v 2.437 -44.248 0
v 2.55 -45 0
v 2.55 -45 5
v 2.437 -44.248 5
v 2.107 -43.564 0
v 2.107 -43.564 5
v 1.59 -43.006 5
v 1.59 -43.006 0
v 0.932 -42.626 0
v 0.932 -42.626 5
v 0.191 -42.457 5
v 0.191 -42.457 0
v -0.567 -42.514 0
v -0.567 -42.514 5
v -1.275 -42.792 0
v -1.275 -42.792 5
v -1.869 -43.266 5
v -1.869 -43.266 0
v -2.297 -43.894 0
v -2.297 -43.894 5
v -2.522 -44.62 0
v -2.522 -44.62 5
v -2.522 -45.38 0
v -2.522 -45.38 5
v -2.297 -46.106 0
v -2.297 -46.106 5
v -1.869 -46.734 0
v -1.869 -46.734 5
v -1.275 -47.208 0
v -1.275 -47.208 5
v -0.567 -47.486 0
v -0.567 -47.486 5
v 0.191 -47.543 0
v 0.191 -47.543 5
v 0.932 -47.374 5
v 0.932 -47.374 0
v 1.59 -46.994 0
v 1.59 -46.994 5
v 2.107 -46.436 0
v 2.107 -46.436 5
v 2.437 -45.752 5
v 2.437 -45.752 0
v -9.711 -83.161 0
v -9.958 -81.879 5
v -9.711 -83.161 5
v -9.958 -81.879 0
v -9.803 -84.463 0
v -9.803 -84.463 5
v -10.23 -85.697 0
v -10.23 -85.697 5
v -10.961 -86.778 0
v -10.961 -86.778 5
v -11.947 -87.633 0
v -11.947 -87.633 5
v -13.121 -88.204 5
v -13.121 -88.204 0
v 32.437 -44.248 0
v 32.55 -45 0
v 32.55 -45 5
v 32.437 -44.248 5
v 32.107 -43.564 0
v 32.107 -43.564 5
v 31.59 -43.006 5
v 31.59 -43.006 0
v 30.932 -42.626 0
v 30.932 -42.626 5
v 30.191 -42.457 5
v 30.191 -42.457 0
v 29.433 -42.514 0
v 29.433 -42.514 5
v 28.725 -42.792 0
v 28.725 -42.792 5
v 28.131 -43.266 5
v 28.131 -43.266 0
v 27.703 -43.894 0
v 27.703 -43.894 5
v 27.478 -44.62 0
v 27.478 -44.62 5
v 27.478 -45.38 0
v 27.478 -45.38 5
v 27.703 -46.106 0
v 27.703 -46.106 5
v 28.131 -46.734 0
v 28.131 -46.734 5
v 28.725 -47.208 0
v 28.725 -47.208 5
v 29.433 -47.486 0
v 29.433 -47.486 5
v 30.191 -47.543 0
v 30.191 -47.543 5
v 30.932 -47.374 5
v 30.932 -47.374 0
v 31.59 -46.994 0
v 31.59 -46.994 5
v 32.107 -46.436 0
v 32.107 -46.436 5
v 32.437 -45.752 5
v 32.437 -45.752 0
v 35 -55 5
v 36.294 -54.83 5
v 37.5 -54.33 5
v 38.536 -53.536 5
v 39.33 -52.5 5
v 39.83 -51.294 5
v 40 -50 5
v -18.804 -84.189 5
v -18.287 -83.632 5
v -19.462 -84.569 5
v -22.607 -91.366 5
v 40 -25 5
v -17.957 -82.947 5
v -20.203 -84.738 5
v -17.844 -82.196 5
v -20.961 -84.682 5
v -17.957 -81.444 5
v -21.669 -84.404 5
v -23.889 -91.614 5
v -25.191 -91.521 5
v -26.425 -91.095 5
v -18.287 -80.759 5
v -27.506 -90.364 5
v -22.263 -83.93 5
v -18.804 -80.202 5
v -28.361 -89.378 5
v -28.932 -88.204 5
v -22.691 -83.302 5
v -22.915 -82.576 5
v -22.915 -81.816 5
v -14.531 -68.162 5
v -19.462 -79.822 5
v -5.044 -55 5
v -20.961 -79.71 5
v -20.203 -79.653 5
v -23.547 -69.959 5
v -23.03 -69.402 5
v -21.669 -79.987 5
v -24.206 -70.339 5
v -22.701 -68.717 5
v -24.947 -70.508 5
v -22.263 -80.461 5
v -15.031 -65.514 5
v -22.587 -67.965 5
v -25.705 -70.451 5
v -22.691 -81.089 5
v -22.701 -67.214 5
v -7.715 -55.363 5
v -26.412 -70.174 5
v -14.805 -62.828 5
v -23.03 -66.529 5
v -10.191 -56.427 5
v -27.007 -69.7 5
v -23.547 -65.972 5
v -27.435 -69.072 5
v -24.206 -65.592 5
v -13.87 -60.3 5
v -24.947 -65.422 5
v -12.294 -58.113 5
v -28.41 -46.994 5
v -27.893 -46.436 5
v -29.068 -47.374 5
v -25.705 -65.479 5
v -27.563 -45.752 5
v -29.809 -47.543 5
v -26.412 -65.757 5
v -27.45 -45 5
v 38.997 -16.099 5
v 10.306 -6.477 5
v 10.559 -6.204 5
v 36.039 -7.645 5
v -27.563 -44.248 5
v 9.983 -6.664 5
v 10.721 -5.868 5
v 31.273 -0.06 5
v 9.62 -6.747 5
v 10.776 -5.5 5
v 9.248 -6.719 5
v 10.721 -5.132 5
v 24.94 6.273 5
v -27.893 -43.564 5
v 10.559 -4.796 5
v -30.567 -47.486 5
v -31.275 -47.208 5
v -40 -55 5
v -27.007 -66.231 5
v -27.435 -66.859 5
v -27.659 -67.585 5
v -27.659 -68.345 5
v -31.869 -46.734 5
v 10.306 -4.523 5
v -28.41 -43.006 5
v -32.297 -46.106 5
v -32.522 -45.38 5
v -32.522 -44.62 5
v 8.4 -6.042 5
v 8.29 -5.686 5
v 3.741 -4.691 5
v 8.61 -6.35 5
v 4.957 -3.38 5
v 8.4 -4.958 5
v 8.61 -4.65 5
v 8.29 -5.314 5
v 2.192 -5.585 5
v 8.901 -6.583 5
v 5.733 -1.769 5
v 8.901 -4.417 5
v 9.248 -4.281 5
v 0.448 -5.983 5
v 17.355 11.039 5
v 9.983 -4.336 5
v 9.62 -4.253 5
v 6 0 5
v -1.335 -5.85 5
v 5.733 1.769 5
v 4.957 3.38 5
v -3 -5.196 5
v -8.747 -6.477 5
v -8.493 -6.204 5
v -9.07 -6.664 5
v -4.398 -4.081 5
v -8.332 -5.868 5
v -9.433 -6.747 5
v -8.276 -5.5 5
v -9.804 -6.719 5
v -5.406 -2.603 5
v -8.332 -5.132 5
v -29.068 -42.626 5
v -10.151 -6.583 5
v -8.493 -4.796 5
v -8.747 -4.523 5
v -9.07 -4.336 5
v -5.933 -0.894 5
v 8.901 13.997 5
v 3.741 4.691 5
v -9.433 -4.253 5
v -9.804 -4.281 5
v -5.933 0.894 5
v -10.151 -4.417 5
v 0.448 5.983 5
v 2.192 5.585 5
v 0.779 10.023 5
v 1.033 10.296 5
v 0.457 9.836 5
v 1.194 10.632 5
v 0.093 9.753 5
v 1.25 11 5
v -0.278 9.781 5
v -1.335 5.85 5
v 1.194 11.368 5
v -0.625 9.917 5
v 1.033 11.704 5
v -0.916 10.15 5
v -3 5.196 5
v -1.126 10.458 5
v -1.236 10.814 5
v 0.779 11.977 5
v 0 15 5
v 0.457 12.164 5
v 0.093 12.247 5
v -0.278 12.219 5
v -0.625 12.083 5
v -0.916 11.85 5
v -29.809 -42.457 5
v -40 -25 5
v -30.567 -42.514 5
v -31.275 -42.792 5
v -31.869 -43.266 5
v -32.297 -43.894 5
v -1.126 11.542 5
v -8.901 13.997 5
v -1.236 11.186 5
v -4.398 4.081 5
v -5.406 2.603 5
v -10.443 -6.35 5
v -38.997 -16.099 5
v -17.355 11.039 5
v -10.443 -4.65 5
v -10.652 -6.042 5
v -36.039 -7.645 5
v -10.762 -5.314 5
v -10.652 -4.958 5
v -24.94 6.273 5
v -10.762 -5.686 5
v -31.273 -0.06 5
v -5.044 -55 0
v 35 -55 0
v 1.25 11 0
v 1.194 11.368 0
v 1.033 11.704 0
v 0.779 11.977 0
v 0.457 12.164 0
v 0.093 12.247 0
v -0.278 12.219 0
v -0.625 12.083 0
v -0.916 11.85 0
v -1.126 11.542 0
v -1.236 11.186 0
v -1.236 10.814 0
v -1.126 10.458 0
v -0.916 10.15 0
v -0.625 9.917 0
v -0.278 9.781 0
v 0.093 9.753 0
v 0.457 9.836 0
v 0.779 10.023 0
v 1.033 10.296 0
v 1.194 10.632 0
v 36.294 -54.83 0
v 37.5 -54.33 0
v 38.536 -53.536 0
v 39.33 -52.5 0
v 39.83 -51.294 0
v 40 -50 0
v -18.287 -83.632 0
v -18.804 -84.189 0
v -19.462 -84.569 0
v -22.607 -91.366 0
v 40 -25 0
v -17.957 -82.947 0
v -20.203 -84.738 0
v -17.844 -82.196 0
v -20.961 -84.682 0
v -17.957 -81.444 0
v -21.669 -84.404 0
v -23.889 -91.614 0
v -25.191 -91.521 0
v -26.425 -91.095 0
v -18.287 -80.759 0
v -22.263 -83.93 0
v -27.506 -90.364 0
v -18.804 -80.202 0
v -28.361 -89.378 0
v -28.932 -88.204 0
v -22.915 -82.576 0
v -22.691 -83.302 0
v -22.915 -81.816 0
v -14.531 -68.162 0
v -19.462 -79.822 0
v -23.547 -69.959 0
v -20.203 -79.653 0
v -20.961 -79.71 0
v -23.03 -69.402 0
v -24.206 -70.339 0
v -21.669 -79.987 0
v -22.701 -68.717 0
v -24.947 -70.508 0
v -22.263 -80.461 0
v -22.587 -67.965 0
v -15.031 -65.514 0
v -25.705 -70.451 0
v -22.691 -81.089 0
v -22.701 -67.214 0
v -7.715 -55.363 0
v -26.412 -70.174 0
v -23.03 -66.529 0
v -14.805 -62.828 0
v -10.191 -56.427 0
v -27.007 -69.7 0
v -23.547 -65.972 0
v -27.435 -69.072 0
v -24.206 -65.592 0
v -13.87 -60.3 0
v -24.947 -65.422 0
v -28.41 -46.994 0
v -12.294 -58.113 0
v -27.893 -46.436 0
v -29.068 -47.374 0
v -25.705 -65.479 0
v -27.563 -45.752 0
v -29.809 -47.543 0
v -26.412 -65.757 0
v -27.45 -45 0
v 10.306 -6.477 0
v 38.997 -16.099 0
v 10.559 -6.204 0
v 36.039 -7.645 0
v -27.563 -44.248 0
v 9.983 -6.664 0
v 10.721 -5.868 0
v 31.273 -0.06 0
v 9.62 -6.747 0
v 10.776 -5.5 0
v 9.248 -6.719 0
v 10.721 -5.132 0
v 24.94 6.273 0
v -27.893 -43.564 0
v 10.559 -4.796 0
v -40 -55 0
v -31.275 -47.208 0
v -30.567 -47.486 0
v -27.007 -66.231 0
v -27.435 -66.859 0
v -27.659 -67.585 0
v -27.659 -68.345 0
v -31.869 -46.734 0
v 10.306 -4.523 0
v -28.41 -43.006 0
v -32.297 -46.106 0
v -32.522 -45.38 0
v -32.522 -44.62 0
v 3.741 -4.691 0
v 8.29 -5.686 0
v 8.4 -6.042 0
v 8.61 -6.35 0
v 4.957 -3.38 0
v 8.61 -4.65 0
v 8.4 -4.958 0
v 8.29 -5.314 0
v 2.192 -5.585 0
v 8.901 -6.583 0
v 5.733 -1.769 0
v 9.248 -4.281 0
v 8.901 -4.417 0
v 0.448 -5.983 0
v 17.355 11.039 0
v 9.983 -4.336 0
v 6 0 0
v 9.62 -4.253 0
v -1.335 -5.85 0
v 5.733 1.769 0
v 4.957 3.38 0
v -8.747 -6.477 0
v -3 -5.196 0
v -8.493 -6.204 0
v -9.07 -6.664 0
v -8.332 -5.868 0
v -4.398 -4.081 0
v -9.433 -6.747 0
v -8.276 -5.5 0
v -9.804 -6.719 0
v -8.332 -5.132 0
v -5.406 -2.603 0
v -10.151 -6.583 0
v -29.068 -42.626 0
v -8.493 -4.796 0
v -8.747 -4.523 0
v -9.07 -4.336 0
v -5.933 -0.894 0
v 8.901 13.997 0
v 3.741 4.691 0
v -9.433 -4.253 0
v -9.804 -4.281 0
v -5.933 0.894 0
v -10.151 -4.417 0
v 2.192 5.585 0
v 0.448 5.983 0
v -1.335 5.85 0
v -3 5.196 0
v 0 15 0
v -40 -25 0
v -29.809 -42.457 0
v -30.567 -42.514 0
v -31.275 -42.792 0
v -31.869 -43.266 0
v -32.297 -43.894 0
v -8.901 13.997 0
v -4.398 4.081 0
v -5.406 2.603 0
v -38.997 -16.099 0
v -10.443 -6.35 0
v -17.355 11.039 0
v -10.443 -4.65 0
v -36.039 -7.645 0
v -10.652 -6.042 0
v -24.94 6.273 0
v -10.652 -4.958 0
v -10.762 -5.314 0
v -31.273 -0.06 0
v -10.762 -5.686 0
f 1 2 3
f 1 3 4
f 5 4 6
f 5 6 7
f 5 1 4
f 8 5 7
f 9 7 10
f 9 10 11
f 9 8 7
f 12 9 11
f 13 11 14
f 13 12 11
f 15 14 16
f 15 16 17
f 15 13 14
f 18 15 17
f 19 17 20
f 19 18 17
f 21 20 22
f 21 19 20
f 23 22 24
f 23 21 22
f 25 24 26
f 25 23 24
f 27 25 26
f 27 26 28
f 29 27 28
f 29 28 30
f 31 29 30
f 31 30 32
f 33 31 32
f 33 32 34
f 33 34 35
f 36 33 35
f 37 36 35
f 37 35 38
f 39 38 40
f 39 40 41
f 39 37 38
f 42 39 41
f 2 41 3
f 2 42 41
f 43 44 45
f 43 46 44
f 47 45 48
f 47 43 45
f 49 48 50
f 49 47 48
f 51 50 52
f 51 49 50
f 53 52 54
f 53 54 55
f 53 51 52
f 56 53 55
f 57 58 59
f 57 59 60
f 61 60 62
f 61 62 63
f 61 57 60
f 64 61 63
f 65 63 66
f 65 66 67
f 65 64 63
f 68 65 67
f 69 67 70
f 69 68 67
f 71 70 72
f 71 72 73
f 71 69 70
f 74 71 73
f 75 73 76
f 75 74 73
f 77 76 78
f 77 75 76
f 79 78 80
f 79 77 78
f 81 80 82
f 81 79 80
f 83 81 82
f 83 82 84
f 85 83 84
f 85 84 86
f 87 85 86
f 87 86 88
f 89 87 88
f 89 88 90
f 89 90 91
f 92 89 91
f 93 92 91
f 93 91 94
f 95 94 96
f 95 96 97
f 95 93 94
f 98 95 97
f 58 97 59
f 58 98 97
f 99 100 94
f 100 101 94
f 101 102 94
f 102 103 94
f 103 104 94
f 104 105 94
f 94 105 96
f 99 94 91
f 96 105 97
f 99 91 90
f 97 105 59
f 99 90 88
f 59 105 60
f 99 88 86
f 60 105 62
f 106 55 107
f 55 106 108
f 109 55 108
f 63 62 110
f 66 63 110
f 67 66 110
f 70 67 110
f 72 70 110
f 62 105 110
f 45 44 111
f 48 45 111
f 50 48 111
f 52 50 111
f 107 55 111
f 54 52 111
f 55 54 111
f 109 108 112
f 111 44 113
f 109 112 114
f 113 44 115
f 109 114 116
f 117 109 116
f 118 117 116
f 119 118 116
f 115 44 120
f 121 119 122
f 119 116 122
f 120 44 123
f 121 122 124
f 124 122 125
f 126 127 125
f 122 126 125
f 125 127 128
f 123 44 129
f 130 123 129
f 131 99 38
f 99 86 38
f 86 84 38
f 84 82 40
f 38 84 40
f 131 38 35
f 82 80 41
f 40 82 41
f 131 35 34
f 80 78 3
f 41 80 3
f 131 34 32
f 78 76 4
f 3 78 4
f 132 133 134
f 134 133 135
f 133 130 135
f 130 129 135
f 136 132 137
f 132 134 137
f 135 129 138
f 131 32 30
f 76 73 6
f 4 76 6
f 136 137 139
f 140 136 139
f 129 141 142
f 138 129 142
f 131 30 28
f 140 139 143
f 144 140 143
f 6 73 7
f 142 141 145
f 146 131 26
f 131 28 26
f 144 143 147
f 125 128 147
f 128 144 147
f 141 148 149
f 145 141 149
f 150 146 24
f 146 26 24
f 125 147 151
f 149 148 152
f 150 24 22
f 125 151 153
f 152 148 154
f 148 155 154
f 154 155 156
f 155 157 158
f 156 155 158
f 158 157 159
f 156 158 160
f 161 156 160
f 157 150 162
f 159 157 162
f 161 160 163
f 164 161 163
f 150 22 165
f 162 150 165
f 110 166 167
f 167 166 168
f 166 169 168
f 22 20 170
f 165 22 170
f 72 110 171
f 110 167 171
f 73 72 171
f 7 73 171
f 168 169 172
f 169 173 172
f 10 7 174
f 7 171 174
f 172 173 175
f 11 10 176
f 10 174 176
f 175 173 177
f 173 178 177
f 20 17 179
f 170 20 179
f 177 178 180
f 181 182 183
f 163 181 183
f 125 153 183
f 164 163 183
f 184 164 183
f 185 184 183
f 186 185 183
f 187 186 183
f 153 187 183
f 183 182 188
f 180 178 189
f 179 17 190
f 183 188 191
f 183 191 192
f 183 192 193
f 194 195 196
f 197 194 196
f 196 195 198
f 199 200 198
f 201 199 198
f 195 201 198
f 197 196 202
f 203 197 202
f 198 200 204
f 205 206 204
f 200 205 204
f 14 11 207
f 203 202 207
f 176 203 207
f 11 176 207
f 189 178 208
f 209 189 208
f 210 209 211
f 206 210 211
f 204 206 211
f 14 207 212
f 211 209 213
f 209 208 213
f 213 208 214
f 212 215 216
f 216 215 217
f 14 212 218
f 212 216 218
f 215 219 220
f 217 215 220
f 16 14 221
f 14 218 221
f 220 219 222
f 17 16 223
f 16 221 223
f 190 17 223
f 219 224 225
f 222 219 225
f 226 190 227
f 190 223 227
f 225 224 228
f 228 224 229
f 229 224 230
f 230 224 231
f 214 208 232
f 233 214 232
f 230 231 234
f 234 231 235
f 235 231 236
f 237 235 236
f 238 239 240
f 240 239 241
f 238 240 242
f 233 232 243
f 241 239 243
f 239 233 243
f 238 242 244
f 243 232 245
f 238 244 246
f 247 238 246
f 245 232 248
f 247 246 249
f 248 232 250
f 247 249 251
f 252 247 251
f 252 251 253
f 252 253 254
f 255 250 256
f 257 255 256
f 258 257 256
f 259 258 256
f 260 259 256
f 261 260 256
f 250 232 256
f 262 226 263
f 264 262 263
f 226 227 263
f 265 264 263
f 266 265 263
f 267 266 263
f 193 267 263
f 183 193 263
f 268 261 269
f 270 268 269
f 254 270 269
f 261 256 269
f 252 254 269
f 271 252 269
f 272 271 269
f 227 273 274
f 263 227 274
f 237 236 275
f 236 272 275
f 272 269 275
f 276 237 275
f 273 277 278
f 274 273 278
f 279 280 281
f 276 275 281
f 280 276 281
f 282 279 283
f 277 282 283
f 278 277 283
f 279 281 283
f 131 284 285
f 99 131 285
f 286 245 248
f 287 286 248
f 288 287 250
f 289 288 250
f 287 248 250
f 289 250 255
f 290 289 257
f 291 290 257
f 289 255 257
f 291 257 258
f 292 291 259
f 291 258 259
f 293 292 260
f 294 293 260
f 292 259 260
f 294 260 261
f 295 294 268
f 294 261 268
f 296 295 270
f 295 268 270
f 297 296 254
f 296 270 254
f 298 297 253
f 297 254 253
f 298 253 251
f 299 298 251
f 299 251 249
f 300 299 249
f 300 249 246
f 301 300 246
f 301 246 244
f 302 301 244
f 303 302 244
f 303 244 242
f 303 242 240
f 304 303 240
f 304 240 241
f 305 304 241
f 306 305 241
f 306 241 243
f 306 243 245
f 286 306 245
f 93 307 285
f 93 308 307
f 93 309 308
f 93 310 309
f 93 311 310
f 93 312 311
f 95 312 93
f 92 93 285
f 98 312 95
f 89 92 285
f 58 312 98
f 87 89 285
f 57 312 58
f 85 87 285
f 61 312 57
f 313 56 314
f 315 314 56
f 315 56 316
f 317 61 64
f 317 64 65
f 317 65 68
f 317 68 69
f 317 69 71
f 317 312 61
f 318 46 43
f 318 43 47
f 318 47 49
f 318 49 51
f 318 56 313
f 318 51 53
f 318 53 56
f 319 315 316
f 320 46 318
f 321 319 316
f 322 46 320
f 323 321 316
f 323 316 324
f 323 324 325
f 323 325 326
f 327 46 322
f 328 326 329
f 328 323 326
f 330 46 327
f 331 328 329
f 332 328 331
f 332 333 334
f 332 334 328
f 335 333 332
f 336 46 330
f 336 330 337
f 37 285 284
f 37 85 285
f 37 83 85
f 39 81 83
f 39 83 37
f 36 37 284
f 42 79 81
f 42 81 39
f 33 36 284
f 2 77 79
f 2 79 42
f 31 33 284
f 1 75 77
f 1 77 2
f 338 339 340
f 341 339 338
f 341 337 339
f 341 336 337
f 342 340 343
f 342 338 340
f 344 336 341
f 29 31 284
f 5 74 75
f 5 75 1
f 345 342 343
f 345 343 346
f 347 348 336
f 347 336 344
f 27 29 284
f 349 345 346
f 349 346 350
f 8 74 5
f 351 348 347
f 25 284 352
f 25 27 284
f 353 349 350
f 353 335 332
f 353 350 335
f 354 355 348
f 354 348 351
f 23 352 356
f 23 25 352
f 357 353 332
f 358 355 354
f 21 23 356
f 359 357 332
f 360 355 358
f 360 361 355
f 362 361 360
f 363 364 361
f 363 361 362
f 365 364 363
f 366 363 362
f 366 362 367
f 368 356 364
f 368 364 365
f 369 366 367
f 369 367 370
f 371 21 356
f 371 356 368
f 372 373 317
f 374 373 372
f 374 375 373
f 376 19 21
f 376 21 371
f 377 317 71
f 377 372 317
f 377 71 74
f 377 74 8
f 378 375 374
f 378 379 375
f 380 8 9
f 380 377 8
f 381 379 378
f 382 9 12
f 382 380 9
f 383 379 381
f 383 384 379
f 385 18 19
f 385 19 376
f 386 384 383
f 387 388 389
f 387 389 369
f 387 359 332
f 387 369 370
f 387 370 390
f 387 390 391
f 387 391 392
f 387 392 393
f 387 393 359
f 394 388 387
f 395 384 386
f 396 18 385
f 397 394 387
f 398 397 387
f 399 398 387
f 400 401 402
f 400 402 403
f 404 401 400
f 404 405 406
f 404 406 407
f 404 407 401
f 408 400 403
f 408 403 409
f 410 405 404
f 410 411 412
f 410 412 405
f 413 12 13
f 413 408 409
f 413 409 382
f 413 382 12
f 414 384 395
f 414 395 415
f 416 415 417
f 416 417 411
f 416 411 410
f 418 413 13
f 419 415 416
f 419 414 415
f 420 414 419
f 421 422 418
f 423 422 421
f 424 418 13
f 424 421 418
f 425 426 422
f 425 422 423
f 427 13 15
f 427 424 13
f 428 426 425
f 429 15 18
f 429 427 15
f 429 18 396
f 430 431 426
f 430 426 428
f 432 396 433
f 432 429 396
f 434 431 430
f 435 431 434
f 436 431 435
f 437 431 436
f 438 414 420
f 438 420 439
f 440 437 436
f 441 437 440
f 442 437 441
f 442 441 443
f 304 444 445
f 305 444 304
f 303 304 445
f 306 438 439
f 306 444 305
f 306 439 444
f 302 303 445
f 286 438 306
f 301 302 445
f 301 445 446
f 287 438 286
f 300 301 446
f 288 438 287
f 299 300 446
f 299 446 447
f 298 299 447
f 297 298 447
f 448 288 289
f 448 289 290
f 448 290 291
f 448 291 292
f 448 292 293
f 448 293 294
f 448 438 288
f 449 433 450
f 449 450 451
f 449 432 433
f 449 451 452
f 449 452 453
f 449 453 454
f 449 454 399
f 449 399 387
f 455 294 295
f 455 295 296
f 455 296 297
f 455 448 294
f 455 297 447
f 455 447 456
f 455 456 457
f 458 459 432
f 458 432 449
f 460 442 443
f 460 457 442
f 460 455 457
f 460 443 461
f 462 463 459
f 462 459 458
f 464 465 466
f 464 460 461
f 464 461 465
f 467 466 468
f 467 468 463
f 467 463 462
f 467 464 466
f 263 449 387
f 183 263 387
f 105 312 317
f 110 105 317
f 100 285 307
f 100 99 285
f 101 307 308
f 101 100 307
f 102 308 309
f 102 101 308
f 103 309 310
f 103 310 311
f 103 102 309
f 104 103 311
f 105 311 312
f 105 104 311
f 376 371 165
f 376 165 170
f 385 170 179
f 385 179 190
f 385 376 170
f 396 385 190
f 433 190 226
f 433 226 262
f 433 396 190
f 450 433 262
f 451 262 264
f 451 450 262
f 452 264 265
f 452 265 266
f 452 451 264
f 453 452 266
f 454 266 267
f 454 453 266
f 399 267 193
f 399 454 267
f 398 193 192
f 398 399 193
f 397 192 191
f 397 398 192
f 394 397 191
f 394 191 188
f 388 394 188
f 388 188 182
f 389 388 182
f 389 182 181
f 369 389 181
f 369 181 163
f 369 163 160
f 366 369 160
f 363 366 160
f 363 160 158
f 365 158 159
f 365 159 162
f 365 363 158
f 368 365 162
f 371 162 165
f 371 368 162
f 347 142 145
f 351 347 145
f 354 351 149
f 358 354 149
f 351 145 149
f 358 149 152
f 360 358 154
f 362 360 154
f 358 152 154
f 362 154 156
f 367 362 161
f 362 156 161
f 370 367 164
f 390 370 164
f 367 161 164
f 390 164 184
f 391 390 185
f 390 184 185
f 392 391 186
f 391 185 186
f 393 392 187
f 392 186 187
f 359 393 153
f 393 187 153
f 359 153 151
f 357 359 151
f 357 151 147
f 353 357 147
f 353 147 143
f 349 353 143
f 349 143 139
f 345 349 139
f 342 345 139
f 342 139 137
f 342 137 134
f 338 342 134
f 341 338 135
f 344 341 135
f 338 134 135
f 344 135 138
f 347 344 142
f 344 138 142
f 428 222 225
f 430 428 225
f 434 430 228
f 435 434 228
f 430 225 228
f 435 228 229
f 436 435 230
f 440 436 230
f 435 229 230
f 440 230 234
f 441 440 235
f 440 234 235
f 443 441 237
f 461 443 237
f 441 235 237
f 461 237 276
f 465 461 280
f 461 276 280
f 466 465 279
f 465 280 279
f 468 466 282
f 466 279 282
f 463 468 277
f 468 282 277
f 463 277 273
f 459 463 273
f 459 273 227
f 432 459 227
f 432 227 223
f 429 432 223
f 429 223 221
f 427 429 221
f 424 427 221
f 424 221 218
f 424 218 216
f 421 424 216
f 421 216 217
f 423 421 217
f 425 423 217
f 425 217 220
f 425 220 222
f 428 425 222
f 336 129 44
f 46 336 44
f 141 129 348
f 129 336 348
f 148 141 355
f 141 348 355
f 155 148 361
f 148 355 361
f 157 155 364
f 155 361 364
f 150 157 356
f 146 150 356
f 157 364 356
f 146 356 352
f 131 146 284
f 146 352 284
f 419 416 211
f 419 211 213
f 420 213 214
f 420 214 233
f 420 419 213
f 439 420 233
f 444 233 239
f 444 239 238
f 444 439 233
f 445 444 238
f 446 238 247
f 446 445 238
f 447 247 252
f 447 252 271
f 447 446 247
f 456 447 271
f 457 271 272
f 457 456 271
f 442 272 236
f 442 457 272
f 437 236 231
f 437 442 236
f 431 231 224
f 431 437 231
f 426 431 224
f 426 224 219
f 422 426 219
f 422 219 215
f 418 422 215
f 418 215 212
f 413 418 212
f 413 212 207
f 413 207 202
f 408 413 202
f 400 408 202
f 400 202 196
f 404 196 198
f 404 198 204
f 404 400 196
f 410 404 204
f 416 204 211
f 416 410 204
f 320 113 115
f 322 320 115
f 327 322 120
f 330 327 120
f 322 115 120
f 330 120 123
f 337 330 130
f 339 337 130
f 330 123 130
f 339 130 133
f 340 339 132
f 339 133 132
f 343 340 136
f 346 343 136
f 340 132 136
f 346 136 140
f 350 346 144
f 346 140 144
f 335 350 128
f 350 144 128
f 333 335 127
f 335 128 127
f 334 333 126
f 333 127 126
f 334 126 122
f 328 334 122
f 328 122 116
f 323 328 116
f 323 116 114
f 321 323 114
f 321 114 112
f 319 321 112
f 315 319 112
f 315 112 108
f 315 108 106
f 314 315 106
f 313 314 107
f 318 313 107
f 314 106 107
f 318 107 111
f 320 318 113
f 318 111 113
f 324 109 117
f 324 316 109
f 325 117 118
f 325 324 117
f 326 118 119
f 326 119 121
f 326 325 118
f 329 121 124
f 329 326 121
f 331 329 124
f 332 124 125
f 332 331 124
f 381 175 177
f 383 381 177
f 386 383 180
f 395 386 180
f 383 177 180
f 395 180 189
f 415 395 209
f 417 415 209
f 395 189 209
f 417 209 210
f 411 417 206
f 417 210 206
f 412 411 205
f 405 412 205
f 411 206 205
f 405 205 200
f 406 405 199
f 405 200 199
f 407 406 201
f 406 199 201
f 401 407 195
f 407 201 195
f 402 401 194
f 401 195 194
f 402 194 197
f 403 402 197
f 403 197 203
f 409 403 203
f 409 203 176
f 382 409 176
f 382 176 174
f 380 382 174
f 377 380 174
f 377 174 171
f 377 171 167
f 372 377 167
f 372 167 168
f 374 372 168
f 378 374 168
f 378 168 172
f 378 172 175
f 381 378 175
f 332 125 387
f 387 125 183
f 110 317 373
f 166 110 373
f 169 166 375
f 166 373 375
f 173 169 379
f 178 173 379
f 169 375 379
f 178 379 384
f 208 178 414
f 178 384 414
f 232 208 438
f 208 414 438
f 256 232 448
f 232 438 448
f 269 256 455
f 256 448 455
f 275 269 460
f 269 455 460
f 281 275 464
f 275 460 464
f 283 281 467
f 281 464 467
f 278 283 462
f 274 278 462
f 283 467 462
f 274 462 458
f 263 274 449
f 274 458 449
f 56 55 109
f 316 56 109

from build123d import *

# Parameters (mm, degrees)
SKETCH_1_R          = 6
SKETCH_1_R_2        = 2.55
EXTRUDE_1_DEPTH     = 5
SKETCH_2_R          = 2.55
EXTRUDE_2_DEPTH     = 5
FILLET_1_R          = 10
FILLET_2_R          = 5
SKETCH_3_R          = 1.25
CUT_EXTRUDE_1_DEPTH = 101.098617334


with BuildPart() as part:
    # ｽｹｯﾁ1 → ﾎﾞｽ - 押し出し1 (new body)
    with BuildSketch(Plane.XY):
        with BuildLine():
            Line((-40, -55), (40, -55))
            Line((40, -55), (40, -25))
            ThreePointArc((40, -25), (0, 15), (-40, -25))
            Line((-40, -25), (-40, -55))
        make_face()
        Circle(SKETCH_1_R, mode=Mode.SUBTRACT)
        with Locations((-30, -45)):
            Circle(SKETCH_1_R_2, mode=Mode.SUBTRACT)
        with Locations((0, -45)):
            Circle(SKETCH_1_R_2, mode=Mode.SUBTRACT)
        with Locations((30, -45)):
            Circle(SKETCH_1_R_2, mode=Mode.SUBTRACT)
    extrude(amount=EXTRUDE_1_DEPTH)

    # ｽｹｯﾁ2 → ﾎﾞｽ - 押し出し2 (add)
    with BuildSketch(Plane.XY.offset(5)):
        Polygon((-27.350889359, -92.947331922), (-40, -55), (-18.918148932, -55), (-8.377223398, -86.622776602), align=None)
        with Locations((-20.393878507, -82.195587877)):
            Circle(SKETCH_2_R, mode=Mode.SUBTRACT)
        with Locations((-25.137294997, -67.965338407)):
            Circle(SKETCH_2_R, mode=Mode.SUBTRACT)
    extrude(amount=-EXTRUDE_2_DEPTH)

    # ﾌｨﾚｯﾄ1
    fillet_1_edges = [part.edges().sort_by_distance(p)[0] for p in [
        (-18.918148932, -55, 2.5),
    ]]
    fillet(fillet_1_edges, radius=FILLET_1_R)

    # ﾌｨﾚｯﾄ2
    fillet_2_edges = [part.edges().sort_by_distance(p)[0] for p in [
        (-8.377223398, -86.622776602, 2.5),
        (-27.350889359, -92.947331922, 2.5),
        (40, -55, 2.5),
    ]]
    fillet(fillet_2_edges, radius=FILLET_2_R)

    # ｽｹｯﾁ3 → ｶｯﾄ - 押し出し1 (cut, through all)
    with BuildSketch(Plane.XY.offset(5)):
        with Locations((0, 11)):
            Circle(SKETCH_3_R)
        with Locations((9.526279442, -5.5)):
            Circle(SKETCH_3_R)
        with Locations((-9.526279442, -5.5)):
            Circle(SKETCH_3_R)
    extrude(amount=-CUT_EXTRUDE_1_DEPTH, mode=Mode.SUBTRACT)


solid = part.part
